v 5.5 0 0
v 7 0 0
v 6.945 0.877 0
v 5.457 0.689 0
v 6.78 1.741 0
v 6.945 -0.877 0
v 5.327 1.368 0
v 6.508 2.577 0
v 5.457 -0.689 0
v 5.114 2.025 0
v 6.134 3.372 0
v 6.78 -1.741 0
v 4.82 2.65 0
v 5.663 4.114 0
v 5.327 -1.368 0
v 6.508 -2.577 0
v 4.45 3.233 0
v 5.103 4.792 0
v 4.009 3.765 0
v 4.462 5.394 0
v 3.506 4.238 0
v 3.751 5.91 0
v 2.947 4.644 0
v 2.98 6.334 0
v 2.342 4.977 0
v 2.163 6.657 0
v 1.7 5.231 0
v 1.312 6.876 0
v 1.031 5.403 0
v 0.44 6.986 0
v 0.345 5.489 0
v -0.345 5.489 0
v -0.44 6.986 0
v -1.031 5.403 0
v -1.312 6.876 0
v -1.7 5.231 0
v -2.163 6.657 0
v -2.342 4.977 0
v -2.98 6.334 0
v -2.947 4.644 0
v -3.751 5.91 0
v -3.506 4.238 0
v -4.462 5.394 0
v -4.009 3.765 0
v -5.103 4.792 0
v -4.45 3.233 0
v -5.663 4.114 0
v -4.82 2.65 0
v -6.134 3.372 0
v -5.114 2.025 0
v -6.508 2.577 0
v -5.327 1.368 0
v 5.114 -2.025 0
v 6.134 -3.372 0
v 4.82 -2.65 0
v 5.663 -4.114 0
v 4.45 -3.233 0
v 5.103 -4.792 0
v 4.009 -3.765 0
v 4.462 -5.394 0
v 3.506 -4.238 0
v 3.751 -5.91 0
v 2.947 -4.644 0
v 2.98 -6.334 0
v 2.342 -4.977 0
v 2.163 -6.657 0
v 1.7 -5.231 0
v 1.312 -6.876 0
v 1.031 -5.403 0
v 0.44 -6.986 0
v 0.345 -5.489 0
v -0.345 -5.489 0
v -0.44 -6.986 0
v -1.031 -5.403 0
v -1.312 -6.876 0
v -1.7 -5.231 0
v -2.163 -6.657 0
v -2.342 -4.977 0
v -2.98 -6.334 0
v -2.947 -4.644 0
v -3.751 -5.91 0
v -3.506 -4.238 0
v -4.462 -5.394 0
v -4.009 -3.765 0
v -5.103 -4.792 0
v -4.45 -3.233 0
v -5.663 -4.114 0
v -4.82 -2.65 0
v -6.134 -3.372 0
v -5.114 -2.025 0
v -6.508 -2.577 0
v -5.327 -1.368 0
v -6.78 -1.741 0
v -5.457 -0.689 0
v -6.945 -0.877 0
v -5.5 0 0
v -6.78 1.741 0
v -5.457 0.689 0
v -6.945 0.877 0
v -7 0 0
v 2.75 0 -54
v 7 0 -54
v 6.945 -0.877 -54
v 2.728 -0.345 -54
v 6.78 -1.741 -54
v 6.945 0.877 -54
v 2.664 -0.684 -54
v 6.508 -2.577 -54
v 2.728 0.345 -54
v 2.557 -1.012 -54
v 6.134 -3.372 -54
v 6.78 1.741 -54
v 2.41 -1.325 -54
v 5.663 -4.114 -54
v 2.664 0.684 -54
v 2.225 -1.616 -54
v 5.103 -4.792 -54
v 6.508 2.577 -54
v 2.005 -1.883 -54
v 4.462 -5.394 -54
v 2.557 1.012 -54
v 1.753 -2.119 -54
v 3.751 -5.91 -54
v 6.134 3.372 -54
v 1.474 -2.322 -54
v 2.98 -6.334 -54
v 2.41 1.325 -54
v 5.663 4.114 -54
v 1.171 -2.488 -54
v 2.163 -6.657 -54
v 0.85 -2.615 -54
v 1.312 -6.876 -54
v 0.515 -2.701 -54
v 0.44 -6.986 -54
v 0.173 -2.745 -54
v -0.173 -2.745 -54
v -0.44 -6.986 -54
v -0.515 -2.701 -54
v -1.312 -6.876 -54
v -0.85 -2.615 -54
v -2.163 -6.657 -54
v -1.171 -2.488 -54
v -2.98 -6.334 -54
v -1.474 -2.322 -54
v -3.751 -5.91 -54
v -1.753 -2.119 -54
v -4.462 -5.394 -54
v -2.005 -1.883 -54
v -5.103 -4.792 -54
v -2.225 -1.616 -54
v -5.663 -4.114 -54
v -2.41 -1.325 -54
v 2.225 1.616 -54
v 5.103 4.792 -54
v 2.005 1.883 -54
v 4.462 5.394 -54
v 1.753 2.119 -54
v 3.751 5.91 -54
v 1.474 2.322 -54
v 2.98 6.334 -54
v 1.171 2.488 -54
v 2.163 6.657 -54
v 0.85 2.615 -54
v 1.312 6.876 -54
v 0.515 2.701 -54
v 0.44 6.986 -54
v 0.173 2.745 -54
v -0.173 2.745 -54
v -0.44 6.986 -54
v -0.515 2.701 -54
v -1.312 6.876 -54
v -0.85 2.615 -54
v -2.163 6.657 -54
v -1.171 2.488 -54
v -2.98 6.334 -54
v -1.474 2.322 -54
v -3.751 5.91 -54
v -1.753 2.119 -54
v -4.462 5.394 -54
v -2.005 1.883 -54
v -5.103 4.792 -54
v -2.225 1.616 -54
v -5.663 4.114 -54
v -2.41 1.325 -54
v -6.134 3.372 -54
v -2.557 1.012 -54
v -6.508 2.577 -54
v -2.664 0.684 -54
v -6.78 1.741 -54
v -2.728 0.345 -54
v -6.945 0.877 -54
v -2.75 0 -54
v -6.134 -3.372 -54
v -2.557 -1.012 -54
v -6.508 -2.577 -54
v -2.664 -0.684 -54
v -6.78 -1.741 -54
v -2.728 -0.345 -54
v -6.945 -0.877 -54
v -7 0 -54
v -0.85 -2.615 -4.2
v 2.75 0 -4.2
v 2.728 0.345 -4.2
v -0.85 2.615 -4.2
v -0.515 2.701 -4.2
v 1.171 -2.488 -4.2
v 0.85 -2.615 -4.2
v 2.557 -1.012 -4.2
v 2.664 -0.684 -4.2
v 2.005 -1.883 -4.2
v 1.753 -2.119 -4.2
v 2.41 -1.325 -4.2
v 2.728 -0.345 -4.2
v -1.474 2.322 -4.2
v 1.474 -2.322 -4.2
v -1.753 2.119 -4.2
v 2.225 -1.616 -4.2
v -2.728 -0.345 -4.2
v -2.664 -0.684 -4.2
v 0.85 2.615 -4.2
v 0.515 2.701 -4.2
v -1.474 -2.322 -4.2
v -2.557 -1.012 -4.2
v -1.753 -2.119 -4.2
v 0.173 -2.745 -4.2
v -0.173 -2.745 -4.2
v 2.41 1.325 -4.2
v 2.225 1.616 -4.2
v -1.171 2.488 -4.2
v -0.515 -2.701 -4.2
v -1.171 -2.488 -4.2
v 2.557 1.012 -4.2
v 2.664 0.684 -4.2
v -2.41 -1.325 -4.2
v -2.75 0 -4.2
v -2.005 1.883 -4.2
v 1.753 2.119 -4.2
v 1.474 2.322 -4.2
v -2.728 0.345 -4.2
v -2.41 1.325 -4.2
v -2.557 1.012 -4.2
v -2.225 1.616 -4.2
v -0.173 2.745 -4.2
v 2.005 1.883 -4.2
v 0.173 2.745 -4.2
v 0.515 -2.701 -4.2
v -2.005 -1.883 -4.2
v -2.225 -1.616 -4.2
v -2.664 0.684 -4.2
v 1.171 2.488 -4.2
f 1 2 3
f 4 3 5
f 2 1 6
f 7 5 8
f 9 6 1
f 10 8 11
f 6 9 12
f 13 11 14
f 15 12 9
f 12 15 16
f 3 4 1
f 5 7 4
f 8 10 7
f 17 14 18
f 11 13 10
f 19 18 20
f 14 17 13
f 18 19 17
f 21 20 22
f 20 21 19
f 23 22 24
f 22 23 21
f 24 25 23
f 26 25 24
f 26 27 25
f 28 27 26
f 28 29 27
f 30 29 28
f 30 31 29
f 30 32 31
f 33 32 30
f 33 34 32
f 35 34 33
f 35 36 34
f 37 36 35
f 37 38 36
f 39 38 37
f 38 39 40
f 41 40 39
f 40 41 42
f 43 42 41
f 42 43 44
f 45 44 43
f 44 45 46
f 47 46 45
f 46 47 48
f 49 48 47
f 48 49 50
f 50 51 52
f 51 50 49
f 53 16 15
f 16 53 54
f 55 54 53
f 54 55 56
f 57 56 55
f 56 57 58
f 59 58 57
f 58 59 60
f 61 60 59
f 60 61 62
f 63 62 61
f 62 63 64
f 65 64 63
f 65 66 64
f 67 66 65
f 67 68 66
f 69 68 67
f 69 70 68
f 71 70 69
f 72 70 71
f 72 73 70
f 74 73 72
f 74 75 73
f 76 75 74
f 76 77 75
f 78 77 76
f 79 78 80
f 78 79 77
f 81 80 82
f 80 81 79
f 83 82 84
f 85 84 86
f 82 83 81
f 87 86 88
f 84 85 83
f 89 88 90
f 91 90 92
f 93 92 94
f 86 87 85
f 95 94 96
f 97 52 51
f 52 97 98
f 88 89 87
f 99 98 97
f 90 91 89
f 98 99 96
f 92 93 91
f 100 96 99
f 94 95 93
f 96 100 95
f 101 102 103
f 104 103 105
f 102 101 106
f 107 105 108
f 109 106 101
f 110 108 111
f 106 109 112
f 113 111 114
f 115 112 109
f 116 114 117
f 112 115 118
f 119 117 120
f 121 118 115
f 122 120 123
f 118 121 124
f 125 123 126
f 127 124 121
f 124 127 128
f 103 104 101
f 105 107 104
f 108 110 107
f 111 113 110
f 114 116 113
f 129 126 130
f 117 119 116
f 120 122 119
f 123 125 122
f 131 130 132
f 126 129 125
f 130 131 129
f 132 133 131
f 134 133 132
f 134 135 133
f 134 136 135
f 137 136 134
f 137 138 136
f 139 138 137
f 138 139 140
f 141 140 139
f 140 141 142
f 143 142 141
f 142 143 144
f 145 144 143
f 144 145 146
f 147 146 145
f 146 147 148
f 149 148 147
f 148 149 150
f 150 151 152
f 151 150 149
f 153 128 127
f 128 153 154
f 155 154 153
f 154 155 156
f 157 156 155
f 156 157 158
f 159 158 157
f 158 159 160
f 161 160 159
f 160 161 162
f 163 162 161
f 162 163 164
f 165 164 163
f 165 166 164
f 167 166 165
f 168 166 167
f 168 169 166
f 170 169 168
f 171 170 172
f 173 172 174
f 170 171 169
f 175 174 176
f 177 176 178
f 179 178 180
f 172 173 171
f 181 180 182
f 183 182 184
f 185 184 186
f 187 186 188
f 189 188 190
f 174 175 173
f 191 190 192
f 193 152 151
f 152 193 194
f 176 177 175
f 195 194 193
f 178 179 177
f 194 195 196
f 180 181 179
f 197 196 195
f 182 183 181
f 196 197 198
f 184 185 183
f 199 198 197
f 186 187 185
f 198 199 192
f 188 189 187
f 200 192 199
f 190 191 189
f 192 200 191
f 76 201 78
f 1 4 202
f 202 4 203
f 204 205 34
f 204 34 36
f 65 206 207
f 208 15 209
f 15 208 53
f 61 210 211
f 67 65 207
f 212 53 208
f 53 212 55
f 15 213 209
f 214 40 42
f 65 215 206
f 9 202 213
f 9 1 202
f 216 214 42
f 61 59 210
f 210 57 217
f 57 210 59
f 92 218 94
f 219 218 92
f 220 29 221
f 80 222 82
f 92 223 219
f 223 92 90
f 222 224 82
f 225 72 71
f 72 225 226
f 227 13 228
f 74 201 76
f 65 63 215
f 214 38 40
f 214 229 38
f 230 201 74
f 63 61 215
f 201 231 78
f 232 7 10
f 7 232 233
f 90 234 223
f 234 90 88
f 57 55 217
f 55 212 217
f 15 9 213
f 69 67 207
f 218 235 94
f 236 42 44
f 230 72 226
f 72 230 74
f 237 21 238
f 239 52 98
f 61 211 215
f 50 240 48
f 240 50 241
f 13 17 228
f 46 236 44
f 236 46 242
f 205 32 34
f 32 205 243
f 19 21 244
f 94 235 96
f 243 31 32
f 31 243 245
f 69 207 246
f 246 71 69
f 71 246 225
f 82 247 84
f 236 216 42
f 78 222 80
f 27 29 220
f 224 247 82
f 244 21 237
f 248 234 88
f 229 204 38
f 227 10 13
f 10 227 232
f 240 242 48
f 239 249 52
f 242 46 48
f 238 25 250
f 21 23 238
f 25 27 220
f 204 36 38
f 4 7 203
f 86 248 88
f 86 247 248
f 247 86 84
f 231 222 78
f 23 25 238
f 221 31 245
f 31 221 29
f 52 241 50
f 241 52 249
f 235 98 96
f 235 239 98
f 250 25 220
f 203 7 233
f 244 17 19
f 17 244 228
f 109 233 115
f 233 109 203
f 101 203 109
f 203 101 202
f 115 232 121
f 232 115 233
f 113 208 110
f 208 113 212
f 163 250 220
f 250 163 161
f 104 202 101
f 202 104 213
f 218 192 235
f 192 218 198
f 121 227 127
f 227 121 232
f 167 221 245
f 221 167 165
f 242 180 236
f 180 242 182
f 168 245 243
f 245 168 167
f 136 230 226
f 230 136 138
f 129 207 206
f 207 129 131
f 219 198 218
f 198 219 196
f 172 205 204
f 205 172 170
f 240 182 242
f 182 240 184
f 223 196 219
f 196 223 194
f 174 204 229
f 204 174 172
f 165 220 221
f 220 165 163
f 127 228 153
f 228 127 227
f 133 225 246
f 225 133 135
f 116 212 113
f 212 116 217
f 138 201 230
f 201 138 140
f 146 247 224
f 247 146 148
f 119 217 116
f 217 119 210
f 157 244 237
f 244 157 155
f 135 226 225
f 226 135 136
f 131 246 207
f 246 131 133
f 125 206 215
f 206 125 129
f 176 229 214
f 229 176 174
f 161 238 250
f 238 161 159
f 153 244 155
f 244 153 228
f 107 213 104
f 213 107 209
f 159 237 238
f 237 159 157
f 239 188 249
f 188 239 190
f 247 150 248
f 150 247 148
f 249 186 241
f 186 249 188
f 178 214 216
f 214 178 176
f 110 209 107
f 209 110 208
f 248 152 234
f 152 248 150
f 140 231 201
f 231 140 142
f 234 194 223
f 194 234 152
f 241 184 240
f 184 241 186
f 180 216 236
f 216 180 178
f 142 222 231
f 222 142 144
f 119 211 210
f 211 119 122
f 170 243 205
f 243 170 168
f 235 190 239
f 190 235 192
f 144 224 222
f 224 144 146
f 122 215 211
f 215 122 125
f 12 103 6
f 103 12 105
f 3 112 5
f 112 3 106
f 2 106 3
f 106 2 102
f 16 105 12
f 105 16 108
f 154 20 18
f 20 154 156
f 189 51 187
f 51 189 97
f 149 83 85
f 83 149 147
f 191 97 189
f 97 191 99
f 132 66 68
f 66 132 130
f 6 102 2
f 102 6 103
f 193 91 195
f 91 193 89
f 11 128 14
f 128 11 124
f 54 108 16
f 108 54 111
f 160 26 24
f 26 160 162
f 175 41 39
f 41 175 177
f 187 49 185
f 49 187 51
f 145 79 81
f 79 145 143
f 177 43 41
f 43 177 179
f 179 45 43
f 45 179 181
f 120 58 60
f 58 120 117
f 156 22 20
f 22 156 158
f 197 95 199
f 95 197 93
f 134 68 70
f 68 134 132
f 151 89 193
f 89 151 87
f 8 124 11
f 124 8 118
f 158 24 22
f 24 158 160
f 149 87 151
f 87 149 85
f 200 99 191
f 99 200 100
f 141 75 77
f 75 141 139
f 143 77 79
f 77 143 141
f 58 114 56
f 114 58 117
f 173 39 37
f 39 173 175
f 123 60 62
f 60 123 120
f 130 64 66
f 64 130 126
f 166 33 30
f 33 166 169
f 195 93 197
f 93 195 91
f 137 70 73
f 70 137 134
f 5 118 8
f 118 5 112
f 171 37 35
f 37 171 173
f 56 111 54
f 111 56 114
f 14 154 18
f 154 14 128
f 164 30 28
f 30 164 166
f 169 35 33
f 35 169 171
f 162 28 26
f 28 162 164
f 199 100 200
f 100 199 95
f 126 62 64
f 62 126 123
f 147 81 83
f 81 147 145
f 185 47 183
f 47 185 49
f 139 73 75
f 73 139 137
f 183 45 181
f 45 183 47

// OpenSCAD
$fn = 50;


difference() {
	union() {
		translate(v = [0, 0, -54.0000000000]) {
			cylinder(h = 54, r = 7.0000000000);
		}
	}
	union() {
		translate(v = [0, 0, 0]) {
			rotate(a = [0, 0, 0]) {
				difference() {
					union() {
						#translate(v = [0, 0, -54.0000000000]) {
							cylinder(h = 54, r = 2.2500000000);
						}
						#translate(v = [0, 0, -4.2000000000]) {
							cylinder(h = 4.2000000000, r = 7.0000000000, r1 = 2.7500000000, r2 = 5.5000000000);
						}
						#translate(v = [0, 0, -54.0000000000]) {
							cylinder(h = 54, r = 2.7500000000);
						}
						#translate(v = [0, 0, -54.0000000000]) {
							cylinder(h = 54, r = 2.2500000000);
						}
					}
					union();
				}
			}
		}
	}
}
